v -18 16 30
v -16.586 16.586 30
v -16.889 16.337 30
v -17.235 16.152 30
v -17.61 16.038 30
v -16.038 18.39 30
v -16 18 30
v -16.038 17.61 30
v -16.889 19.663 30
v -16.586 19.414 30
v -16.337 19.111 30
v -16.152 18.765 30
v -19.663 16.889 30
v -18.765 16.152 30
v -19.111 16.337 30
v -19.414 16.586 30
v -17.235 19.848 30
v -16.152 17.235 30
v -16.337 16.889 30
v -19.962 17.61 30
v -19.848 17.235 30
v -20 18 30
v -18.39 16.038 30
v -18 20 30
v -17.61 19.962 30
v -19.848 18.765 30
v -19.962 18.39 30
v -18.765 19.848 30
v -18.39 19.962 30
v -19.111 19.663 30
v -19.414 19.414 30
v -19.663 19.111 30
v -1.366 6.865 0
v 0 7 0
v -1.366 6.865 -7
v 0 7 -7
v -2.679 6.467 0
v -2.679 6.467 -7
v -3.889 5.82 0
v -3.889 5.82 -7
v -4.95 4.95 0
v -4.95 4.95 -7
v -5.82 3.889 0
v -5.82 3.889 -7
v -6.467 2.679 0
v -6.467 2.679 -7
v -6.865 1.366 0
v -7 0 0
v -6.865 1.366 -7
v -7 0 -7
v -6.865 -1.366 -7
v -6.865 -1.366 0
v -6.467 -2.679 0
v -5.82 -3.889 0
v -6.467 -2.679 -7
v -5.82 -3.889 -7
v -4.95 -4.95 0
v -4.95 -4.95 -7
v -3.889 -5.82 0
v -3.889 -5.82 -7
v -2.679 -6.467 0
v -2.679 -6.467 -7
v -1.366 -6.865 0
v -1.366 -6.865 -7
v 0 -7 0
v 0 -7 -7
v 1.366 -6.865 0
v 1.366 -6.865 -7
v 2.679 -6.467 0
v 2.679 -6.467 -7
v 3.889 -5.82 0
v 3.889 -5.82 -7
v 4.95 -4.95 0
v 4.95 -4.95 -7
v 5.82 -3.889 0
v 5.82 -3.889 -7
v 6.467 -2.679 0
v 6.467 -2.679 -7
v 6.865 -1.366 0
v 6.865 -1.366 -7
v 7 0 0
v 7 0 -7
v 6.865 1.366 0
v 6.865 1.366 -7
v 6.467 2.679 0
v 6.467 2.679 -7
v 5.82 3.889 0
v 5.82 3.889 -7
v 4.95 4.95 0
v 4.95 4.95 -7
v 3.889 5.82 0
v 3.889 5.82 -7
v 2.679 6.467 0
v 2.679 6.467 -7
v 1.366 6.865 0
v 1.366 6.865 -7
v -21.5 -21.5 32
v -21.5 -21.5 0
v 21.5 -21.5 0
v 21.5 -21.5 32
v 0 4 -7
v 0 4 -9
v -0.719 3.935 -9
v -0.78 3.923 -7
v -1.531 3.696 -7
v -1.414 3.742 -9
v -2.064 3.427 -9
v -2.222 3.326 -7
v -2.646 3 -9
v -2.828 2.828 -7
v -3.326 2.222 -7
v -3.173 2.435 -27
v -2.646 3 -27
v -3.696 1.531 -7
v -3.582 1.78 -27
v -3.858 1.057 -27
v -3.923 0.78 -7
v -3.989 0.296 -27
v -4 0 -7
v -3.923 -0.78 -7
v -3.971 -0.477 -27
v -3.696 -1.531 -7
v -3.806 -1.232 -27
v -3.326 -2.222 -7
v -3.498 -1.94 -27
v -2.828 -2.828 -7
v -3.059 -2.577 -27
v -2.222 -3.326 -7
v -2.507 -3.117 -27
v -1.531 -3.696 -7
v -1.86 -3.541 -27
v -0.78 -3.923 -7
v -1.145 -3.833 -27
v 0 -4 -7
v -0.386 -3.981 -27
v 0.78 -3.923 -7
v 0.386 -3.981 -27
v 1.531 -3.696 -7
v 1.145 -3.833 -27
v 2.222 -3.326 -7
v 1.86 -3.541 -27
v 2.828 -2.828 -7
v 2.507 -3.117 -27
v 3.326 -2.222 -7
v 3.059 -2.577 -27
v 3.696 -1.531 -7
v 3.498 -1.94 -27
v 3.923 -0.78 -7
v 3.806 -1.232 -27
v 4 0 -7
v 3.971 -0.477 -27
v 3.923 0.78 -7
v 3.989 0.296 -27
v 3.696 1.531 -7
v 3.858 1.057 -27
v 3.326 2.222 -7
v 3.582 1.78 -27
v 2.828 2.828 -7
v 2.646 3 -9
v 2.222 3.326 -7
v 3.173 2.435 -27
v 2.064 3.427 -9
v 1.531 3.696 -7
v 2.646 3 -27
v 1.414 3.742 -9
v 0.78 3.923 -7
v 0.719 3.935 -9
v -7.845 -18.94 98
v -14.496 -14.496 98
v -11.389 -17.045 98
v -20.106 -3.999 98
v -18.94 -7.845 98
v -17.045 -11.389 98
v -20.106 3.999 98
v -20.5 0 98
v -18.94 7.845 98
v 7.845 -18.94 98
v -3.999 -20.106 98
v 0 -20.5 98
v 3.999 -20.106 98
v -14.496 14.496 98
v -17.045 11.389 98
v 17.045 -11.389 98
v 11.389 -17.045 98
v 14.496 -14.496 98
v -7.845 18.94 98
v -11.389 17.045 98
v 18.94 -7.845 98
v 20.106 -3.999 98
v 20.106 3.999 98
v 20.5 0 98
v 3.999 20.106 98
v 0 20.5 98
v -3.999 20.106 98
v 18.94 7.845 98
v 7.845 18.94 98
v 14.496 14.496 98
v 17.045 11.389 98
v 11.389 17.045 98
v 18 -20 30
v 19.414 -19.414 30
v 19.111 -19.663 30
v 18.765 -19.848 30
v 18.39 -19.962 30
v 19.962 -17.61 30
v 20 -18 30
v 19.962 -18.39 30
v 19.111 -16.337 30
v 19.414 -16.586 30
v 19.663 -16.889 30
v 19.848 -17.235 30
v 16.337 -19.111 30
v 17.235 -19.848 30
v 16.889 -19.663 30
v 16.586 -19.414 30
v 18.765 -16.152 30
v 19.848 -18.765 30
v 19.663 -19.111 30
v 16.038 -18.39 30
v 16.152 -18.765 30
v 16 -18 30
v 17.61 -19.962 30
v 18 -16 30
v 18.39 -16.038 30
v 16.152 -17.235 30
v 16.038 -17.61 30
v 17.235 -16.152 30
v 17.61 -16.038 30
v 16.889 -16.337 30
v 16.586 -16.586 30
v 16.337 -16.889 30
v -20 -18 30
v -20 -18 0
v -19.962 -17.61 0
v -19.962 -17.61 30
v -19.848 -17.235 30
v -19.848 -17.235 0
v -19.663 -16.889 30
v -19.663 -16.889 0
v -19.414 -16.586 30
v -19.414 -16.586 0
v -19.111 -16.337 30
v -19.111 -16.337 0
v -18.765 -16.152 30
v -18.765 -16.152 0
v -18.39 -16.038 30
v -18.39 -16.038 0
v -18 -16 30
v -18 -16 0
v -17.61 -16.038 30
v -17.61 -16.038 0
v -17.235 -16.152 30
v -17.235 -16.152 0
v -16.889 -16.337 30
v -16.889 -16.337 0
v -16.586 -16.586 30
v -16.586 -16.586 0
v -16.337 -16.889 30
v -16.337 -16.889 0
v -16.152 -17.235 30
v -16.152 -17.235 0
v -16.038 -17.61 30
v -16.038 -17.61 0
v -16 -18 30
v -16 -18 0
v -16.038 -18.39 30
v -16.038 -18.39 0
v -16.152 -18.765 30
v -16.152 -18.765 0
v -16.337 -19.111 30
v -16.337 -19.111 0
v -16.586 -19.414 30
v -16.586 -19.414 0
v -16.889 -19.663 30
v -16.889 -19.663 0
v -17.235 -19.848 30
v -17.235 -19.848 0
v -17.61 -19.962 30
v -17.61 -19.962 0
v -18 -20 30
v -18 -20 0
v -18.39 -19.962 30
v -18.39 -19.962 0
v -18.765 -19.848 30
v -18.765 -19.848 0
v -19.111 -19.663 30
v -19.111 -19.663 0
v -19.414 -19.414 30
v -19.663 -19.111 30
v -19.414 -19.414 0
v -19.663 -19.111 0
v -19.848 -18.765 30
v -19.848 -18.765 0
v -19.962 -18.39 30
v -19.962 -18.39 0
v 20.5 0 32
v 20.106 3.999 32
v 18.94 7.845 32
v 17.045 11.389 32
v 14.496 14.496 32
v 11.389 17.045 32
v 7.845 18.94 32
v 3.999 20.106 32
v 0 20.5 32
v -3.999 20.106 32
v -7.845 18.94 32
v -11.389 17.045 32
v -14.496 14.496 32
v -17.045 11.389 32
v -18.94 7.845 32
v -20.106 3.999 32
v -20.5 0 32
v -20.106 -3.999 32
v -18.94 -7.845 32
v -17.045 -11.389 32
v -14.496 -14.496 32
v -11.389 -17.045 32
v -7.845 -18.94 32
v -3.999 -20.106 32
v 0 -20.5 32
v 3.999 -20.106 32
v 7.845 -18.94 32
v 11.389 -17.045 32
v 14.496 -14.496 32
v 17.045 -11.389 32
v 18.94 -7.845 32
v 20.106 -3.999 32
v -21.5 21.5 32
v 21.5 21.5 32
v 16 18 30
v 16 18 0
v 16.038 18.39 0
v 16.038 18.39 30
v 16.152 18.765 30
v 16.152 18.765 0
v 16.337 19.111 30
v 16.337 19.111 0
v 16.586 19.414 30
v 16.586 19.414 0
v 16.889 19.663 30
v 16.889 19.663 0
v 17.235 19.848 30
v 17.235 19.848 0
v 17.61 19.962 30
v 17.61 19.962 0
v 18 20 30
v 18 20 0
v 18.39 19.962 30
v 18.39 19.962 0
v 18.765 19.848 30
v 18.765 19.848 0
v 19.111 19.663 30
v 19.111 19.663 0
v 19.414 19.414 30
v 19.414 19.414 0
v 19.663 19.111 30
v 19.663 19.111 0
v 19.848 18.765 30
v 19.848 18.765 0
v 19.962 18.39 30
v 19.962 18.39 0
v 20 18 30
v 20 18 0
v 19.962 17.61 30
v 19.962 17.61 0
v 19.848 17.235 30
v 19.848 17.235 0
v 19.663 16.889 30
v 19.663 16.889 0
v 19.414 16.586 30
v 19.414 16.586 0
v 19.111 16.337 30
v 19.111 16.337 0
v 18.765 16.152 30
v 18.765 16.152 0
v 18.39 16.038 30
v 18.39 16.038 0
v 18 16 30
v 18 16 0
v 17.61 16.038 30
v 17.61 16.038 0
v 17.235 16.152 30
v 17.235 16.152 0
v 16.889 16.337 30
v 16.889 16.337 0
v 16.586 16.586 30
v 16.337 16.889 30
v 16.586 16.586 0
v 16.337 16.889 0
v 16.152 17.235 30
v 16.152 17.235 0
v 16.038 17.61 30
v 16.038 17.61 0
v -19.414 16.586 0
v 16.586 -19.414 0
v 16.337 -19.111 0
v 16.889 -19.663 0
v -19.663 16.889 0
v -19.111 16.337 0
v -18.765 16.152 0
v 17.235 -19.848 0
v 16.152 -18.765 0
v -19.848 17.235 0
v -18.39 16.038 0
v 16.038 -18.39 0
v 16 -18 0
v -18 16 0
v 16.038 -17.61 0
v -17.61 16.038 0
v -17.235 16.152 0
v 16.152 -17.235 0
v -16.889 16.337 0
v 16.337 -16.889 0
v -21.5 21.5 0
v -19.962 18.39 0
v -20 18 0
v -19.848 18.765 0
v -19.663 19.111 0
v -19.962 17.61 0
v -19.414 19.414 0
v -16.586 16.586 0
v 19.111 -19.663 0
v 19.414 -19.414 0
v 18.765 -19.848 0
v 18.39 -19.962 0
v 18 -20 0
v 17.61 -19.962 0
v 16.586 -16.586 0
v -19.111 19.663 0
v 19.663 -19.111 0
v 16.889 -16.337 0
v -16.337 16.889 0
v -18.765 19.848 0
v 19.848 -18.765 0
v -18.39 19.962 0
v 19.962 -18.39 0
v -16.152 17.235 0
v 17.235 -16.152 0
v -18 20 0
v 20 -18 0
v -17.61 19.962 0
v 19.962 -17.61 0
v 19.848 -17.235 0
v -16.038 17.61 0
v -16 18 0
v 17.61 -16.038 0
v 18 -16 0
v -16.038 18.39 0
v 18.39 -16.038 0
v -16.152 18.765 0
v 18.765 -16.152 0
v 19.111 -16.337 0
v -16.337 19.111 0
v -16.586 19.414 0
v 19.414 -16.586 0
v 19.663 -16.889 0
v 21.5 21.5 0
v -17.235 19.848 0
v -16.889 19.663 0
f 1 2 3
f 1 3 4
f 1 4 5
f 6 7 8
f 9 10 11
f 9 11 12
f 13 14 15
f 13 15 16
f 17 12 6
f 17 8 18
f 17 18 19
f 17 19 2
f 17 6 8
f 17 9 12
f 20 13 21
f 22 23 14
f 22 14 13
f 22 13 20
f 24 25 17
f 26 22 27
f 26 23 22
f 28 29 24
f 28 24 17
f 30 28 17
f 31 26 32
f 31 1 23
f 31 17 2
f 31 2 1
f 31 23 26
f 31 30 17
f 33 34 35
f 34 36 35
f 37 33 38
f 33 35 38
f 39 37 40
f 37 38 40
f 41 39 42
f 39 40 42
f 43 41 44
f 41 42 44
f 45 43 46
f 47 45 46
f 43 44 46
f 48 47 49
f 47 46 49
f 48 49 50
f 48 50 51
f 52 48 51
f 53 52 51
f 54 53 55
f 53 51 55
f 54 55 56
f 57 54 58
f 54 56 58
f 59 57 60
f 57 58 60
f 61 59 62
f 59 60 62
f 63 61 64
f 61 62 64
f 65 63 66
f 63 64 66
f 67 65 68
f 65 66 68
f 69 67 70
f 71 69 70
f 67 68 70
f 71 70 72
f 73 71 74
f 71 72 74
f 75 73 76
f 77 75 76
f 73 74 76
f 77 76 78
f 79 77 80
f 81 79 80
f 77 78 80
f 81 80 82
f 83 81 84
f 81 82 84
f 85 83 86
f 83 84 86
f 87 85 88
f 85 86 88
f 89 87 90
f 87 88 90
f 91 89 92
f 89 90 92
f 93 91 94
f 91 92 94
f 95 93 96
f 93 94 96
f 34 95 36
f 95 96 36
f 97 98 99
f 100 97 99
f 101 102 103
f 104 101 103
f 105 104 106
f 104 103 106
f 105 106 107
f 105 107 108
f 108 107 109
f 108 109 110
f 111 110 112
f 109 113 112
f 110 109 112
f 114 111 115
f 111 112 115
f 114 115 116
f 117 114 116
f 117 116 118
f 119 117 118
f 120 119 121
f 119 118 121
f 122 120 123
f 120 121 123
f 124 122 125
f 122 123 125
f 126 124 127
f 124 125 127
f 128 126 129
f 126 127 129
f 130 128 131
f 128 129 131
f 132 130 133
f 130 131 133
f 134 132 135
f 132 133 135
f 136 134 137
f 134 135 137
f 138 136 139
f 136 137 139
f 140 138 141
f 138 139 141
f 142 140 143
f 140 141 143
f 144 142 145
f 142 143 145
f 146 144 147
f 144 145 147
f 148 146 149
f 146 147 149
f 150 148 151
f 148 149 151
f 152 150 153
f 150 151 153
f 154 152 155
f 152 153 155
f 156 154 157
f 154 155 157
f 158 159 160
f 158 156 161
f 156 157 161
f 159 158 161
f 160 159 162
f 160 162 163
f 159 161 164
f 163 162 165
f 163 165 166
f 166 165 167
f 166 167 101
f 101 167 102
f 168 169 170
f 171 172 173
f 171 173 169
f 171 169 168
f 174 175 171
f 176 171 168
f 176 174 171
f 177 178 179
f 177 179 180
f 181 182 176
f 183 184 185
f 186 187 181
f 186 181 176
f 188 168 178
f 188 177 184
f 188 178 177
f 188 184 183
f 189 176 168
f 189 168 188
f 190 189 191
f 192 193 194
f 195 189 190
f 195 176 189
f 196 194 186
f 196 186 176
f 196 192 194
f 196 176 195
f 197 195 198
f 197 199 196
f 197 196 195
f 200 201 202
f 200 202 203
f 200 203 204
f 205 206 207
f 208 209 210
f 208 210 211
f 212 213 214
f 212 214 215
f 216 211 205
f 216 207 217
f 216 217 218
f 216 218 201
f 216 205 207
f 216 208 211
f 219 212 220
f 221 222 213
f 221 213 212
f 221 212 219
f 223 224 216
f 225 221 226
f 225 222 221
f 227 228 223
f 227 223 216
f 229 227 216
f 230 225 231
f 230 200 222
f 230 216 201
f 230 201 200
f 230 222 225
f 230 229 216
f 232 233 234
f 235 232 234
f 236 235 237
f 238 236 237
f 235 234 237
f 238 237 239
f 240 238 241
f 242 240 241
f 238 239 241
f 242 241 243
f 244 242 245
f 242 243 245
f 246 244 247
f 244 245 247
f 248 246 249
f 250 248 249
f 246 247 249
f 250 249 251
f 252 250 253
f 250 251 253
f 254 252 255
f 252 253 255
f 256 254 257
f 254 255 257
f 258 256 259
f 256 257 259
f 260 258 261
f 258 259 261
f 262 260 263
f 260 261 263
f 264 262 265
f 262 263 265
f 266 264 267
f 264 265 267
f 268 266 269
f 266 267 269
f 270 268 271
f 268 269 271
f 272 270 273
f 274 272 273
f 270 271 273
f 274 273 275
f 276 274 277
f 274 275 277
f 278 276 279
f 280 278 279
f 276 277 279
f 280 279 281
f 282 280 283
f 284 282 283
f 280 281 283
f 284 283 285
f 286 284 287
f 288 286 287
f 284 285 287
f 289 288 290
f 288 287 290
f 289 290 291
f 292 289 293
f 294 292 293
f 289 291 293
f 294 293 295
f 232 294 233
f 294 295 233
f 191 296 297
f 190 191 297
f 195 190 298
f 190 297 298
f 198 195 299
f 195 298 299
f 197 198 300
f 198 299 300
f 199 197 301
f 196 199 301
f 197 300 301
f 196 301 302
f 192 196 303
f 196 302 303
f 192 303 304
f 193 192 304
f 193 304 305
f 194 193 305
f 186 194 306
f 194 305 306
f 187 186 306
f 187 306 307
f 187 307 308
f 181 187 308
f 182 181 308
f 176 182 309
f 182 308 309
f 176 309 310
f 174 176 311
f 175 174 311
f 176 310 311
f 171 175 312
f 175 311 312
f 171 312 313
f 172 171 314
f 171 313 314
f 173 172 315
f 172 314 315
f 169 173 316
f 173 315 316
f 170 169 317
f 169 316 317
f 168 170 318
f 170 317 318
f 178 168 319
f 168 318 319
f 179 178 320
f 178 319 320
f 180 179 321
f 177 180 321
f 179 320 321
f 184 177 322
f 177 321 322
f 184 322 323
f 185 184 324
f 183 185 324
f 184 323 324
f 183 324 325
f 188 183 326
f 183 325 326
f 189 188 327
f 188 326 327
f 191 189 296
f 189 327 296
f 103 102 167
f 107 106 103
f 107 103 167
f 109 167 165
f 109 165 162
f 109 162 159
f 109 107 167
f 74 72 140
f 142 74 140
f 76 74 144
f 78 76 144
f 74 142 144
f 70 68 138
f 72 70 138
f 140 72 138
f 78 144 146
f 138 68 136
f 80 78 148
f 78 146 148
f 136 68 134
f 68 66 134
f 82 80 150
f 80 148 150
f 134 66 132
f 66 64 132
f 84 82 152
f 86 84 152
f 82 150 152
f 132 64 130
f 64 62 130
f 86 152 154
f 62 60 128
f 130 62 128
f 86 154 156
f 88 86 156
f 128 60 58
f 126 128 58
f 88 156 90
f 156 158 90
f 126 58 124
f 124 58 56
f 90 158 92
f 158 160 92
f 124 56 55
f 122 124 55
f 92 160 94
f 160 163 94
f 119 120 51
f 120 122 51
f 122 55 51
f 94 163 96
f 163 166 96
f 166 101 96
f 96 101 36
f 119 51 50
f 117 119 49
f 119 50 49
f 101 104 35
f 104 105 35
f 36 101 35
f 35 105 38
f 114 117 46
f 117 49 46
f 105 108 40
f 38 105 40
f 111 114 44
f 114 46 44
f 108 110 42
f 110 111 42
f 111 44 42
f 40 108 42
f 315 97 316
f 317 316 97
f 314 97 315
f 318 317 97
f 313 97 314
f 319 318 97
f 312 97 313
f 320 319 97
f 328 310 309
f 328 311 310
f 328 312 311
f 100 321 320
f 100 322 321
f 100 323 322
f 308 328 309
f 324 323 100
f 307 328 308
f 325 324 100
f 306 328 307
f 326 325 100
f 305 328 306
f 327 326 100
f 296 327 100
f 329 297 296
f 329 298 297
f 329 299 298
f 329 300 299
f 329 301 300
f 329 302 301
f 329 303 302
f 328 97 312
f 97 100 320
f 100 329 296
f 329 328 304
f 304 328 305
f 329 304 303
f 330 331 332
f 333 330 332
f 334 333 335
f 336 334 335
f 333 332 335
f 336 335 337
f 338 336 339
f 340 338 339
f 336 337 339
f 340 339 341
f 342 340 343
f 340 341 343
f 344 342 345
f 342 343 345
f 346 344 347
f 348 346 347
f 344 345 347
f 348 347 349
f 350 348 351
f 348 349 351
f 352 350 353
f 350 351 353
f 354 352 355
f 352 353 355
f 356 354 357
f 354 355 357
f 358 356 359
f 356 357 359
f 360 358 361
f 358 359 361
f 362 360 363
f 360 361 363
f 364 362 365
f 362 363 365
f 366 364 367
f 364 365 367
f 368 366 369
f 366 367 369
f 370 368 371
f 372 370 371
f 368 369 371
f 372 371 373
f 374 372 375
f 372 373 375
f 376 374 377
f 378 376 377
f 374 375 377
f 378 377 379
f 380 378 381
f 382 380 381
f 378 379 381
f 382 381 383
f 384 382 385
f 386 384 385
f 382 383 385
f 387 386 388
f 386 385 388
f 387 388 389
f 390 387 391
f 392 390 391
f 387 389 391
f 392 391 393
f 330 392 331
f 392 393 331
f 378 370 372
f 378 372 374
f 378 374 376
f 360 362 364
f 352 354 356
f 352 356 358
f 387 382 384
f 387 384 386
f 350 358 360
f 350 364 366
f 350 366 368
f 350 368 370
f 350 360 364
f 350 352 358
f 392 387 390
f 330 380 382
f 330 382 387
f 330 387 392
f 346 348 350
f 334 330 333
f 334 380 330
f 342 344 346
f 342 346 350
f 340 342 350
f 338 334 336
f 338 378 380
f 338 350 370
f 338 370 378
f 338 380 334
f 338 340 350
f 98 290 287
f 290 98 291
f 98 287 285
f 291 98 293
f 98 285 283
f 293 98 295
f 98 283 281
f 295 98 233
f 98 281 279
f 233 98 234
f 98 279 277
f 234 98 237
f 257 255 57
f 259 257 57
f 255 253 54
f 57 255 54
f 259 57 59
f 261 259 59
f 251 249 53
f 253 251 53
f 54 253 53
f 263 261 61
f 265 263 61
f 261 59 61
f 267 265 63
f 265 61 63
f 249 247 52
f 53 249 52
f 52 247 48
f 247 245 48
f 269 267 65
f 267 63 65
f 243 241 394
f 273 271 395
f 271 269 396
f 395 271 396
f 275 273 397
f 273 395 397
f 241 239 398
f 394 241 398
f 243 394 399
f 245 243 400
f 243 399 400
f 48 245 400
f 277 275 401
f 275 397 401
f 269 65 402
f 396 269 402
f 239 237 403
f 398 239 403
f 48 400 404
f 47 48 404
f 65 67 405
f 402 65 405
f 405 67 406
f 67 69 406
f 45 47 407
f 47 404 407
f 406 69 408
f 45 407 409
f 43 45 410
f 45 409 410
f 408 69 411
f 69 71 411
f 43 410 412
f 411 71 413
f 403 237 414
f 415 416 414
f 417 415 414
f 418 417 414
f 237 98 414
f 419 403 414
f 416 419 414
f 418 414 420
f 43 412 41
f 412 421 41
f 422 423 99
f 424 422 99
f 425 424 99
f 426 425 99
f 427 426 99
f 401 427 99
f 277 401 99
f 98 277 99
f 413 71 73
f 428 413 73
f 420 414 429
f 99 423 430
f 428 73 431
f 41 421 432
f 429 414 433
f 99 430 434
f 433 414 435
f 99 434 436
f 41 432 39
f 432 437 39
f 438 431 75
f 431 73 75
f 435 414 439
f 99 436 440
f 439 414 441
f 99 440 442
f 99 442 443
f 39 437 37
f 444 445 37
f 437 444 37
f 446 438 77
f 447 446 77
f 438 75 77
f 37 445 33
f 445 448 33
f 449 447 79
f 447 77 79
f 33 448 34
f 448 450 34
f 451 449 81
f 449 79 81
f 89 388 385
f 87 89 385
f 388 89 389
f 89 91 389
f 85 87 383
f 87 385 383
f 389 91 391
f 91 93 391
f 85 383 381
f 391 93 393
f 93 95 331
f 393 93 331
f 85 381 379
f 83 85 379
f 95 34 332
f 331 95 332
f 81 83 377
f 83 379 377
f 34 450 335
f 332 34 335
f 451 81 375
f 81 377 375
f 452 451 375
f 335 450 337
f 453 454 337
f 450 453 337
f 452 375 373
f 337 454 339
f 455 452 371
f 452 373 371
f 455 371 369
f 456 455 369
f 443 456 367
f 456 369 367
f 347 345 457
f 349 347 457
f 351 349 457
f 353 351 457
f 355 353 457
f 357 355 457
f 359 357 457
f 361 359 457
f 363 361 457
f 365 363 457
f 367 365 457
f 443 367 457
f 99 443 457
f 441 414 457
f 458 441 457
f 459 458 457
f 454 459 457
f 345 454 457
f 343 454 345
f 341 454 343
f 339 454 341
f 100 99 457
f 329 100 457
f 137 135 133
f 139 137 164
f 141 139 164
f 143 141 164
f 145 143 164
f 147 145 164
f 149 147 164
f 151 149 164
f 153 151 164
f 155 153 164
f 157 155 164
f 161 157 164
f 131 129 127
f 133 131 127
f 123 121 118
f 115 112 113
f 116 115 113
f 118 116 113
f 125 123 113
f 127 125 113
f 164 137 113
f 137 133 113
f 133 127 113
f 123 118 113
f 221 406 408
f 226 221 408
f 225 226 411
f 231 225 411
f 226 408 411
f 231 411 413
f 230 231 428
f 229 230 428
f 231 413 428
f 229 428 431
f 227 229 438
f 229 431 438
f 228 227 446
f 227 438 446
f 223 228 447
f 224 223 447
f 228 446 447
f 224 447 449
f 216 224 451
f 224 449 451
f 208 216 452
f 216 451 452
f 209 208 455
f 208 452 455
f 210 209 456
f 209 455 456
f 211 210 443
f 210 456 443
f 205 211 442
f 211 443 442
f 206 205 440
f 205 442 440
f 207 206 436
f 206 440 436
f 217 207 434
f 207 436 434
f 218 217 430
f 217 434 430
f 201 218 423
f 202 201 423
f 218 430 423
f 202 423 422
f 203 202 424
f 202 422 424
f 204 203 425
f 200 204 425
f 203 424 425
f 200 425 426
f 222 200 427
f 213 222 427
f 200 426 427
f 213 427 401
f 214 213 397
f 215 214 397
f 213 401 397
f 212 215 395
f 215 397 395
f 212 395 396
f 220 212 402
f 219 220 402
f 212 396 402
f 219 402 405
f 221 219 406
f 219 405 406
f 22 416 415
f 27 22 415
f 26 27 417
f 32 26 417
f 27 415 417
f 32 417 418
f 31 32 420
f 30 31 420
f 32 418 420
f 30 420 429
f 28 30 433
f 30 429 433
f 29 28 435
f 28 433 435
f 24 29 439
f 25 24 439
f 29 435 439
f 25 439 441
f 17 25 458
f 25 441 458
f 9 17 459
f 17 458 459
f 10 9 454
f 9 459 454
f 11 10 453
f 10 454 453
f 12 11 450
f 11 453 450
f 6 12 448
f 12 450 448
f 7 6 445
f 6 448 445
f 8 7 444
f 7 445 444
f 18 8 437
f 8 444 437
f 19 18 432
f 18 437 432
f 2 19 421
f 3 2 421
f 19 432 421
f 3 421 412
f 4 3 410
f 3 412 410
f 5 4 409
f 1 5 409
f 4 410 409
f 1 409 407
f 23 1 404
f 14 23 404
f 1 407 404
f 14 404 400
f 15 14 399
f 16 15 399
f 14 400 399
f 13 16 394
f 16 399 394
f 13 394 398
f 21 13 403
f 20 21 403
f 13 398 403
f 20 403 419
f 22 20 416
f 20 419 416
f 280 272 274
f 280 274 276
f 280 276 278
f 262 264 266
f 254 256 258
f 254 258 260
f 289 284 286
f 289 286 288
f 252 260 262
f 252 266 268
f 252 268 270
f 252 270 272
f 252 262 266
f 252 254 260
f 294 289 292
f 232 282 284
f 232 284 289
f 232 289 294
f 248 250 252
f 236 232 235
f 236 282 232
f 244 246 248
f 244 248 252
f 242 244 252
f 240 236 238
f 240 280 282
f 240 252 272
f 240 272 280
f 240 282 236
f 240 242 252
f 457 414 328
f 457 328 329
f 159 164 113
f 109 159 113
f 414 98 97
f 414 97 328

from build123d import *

# Parameters (mm, degrees)
SKETCH_1_W          = 43
SKETCH_1_H          = 43
EXTRUDE_1_DEPTH     = 32
SKETCH_5_W          = 10.30081486
SKETCH_5_H          = 4.860243631
CUT_EXTRUDE_1_DEPTH = 18
SKETCH_6_R          = 20.5
EXTRUDE_2_DEPTH     = 66
SKETCH_7_R          = 2
CUT_EXTRUDE_2_DEPTH = 30


with BuildPart() as part:
    # 草图1 → 凸台-拉伸1 (new body)
    with BuildSketch(Plane.XY):
        Rectangle(SKETCH_1_W, SKETCH_1_H)
    extrude(amount=EXTRUDE_1_DEPTH)

    # 草图4 → 旋转1 (revolve)
    with BuildSketch(Plane(origin=(0, 0, 0), x_dir=(0, 0, -1), z_dir=(1, 0, 0))):
        Polygon((0, 0), (0, 7), (7, 7), (7, 4), (27, 4), (27, 0), align=None)
    revolve(axis=Axis((0, 0, -27), (0, 0, 1)))

    # 草图5 → 切除-拉伸1 (cut)
    with BuildSketch(Plane(origin=(0, 0, -27), x_dir=(-1, 0, 0), z_dir=(0, 0, -1))):
        with Locations((0.230133924, 5.430121815)):
            Rectangle(SKETCH_5_W, SKETCH_5_H)
    extrude(amount=-CUT_EXTRUDE_1_DEPTH, mode=Mode.SUBTRACT)

    # 草图6 → 凸台-拉伸2 (add)
    with BuildSketch(Plane.XY.offset(32)):
        Circle(SKETCH_6_R)
    extrude(amount=EXTRUDE_2_DEPTH)

    # 草图7 → 切除-拉伸2 (cut)
    with BuildSketch(Plane(origin=(0, 0, 0), x_dir=(-1, 0, 0), z_dir=(0, 0, -1))):
        with Locations((-18, 18)):
            Circle(SKETCH_7_R)
        with Locations((18, 18)):
            Circle(SKETCH_7_R)
        with Locations((18, -18)):
            Circle(SKETCH_7_R)
        with Locations((-18, -18)):
            Circle(SKETCH_7_R)
    extrude(amount=-CUT_EXTRUDE_2_DEPTH, mode=Mode.SUBTRACT)


solid = part.part
